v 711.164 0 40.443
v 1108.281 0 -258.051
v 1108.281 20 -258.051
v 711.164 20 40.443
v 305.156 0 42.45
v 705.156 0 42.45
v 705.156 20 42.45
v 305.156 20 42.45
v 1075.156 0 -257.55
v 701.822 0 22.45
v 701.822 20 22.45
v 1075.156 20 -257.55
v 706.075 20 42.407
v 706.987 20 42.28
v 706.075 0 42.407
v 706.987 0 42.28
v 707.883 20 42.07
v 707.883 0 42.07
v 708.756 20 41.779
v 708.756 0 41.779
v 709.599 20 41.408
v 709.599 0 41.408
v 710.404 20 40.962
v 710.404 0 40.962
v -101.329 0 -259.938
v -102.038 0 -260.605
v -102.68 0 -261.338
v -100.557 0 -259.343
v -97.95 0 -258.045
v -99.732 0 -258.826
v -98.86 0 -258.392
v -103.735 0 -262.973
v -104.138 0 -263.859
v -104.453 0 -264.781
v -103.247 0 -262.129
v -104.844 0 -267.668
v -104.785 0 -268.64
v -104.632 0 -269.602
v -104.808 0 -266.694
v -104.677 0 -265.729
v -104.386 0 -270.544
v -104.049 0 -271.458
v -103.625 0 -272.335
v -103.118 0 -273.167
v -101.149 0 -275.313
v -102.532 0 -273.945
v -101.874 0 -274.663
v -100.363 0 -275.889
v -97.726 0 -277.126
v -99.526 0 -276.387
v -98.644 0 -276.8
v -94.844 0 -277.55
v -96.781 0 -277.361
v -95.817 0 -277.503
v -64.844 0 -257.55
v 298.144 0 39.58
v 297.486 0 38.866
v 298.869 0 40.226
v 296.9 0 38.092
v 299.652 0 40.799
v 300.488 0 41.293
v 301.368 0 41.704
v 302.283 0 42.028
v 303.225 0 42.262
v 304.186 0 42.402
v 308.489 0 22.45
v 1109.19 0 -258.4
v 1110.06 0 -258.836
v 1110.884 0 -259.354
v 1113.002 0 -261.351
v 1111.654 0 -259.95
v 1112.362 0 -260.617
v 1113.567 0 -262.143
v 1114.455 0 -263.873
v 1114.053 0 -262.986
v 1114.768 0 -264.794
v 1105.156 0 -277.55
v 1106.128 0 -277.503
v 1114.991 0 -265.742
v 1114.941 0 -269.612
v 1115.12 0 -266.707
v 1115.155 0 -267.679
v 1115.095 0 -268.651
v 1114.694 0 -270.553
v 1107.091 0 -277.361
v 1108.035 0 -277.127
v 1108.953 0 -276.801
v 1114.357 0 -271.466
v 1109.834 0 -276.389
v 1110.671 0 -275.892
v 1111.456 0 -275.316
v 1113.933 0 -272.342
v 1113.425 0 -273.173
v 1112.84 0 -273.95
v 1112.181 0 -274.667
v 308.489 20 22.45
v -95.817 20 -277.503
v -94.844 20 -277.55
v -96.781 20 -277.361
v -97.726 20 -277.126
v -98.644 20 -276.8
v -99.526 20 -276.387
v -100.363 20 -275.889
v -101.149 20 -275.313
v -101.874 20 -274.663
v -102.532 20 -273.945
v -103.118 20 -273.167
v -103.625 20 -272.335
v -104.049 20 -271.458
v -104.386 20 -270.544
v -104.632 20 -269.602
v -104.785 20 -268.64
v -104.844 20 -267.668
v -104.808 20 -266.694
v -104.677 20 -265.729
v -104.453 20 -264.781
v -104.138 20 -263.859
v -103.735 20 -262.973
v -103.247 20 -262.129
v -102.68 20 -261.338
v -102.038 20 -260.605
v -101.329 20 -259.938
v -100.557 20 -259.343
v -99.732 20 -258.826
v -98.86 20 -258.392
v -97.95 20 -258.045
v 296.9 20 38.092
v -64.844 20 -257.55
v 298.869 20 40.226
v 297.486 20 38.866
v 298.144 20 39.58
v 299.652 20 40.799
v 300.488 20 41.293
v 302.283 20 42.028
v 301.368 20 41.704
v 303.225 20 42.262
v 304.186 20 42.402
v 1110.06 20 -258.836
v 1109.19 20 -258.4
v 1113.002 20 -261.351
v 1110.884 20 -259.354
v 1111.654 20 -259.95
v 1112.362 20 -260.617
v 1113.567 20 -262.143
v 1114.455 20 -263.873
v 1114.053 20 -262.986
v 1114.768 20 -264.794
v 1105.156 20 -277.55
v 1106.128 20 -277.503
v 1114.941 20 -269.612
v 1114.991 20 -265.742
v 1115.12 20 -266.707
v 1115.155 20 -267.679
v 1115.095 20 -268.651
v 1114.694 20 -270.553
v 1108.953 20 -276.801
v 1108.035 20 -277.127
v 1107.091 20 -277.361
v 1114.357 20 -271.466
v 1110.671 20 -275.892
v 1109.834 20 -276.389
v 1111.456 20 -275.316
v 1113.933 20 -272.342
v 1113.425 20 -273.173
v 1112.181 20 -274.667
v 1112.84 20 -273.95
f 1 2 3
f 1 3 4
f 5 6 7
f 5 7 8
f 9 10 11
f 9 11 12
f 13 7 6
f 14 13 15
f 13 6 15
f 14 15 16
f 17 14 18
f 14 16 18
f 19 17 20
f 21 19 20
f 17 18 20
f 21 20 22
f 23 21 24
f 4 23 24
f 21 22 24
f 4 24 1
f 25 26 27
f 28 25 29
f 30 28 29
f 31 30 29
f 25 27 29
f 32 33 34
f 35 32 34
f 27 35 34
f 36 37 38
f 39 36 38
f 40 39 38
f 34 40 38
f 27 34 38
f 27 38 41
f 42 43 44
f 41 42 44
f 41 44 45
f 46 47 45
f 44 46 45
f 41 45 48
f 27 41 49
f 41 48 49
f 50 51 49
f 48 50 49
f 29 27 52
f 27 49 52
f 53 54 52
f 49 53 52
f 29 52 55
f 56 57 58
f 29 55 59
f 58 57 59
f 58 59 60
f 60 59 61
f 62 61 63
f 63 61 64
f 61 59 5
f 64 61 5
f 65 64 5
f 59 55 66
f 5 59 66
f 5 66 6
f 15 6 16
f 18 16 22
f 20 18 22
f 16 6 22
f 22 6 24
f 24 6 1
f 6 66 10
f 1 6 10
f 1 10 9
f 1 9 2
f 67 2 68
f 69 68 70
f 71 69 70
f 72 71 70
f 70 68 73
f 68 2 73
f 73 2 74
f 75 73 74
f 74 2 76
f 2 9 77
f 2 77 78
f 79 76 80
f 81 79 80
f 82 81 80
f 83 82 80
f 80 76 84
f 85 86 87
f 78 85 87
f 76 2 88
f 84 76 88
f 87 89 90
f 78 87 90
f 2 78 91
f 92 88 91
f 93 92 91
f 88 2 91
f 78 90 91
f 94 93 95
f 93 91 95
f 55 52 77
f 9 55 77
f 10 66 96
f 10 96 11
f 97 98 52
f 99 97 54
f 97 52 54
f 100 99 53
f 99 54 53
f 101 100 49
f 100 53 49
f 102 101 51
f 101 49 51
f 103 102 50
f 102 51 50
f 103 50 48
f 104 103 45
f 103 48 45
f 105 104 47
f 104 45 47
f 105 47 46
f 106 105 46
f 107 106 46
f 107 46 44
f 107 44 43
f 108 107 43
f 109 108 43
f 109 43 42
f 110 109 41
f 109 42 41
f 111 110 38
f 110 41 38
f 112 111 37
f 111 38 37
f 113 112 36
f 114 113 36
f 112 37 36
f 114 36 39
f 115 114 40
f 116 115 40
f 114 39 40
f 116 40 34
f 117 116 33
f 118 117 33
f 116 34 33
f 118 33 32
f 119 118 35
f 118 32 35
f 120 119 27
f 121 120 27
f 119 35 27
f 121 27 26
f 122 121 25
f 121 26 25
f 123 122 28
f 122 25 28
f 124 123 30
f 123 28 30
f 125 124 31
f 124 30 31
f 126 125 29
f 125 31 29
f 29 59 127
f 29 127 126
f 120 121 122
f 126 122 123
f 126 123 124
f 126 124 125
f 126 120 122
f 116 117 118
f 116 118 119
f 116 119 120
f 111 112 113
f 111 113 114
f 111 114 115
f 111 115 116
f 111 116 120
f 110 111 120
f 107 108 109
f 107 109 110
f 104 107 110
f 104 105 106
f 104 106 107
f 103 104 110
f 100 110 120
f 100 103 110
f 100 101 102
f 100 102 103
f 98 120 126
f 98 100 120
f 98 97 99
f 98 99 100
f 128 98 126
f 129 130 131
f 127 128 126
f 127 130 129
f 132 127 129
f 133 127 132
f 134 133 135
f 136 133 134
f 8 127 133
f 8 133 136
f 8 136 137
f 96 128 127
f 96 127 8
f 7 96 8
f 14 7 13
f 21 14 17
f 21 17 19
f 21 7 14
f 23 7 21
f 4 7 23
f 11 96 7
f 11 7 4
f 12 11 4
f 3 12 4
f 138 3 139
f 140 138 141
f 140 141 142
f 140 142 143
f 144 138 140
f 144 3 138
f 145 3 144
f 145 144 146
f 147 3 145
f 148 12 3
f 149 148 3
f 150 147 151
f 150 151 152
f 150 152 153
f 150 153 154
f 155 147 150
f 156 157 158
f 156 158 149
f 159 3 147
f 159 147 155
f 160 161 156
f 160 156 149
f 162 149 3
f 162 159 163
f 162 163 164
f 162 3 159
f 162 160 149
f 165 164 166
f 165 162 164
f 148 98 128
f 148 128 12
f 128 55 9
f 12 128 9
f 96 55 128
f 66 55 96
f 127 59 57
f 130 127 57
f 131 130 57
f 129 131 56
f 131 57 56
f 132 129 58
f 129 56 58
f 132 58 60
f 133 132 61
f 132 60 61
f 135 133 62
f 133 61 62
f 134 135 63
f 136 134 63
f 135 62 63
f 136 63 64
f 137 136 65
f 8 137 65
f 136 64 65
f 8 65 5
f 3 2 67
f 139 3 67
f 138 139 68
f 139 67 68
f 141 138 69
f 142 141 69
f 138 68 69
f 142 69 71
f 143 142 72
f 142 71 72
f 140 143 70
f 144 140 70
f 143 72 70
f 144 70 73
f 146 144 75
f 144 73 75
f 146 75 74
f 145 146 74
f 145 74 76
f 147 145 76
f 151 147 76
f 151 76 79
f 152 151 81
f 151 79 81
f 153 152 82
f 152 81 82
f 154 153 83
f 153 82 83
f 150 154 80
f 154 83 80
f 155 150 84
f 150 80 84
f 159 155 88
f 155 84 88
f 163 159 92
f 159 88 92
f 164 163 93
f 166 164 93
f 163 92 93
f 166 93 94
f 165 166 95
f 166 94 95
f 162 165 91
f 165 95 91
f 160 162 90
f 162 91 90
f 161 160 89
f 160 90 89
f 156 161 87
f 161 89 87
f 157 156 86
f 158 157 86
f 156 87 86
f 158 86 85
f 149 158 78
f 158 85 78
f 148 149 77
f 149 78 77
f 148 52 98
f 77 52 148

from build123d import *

# Parameters (mm, degrees)
SKETCH1_R           = 10
SKETCH1_W           = 1200
SKETCH1_H           = 20
BOSS_EXTRUDE2_DEPTH = 20


with BuildPart() as part:
    # Sketch1 → Boss-Extrude2 (new body)
    with BuildSketch(Plane(origin=(0, 0, 0), x_dir=(1, 0, 0), z_dir=(0, 1, 0))):
        with Locations((-94.844294643, 267.550423494)):
            Circle(SKETCH1_R)
        with Locations((1105.155705357, 267.550423494)):
            Circle(SKETCH1_R)
        with Locations((305.155705357, -32.449576506)):
            Circle(SKETCH1_R)
        with Locations((705.155705357, -32.449576506)):
            Circle(SKETCH1_R)
        with BuildLine():
            Line((305.155705357, -22.449576506), (705.155705357, -22.449576506))
            Line((705.155705357, -22.449576506), (705.155705357, -42.449576506))
            Line((705.155705357, -42.449576506), (305.155705357, -42.449576506))
            ThreePointArc((305.155705357, -42.449576506), (315.155705357, -32.449576506), (305.155705357, -22.449576506))
        make_face()
        with Locations((505.155705357, 267.550423494)):
            Rectangle(SKETCH1_W, SKETCH1_H)
        Polygon((-88.844294643, 275.550423494), (311.155705357, -24.449576506), (302.050378198, -41.95520343), (-103.100204886, 261.907733883), align=None)
        Polygon((1113.4116156, 261.907733883), (711.164164437, -40.443225203), (699.147246278, -24.455927809), (1099.155705268, 275.550423427), align=None)
    extrude(amount=BOSS_EXTRUDE2_DEPTH)


solid = part.part
